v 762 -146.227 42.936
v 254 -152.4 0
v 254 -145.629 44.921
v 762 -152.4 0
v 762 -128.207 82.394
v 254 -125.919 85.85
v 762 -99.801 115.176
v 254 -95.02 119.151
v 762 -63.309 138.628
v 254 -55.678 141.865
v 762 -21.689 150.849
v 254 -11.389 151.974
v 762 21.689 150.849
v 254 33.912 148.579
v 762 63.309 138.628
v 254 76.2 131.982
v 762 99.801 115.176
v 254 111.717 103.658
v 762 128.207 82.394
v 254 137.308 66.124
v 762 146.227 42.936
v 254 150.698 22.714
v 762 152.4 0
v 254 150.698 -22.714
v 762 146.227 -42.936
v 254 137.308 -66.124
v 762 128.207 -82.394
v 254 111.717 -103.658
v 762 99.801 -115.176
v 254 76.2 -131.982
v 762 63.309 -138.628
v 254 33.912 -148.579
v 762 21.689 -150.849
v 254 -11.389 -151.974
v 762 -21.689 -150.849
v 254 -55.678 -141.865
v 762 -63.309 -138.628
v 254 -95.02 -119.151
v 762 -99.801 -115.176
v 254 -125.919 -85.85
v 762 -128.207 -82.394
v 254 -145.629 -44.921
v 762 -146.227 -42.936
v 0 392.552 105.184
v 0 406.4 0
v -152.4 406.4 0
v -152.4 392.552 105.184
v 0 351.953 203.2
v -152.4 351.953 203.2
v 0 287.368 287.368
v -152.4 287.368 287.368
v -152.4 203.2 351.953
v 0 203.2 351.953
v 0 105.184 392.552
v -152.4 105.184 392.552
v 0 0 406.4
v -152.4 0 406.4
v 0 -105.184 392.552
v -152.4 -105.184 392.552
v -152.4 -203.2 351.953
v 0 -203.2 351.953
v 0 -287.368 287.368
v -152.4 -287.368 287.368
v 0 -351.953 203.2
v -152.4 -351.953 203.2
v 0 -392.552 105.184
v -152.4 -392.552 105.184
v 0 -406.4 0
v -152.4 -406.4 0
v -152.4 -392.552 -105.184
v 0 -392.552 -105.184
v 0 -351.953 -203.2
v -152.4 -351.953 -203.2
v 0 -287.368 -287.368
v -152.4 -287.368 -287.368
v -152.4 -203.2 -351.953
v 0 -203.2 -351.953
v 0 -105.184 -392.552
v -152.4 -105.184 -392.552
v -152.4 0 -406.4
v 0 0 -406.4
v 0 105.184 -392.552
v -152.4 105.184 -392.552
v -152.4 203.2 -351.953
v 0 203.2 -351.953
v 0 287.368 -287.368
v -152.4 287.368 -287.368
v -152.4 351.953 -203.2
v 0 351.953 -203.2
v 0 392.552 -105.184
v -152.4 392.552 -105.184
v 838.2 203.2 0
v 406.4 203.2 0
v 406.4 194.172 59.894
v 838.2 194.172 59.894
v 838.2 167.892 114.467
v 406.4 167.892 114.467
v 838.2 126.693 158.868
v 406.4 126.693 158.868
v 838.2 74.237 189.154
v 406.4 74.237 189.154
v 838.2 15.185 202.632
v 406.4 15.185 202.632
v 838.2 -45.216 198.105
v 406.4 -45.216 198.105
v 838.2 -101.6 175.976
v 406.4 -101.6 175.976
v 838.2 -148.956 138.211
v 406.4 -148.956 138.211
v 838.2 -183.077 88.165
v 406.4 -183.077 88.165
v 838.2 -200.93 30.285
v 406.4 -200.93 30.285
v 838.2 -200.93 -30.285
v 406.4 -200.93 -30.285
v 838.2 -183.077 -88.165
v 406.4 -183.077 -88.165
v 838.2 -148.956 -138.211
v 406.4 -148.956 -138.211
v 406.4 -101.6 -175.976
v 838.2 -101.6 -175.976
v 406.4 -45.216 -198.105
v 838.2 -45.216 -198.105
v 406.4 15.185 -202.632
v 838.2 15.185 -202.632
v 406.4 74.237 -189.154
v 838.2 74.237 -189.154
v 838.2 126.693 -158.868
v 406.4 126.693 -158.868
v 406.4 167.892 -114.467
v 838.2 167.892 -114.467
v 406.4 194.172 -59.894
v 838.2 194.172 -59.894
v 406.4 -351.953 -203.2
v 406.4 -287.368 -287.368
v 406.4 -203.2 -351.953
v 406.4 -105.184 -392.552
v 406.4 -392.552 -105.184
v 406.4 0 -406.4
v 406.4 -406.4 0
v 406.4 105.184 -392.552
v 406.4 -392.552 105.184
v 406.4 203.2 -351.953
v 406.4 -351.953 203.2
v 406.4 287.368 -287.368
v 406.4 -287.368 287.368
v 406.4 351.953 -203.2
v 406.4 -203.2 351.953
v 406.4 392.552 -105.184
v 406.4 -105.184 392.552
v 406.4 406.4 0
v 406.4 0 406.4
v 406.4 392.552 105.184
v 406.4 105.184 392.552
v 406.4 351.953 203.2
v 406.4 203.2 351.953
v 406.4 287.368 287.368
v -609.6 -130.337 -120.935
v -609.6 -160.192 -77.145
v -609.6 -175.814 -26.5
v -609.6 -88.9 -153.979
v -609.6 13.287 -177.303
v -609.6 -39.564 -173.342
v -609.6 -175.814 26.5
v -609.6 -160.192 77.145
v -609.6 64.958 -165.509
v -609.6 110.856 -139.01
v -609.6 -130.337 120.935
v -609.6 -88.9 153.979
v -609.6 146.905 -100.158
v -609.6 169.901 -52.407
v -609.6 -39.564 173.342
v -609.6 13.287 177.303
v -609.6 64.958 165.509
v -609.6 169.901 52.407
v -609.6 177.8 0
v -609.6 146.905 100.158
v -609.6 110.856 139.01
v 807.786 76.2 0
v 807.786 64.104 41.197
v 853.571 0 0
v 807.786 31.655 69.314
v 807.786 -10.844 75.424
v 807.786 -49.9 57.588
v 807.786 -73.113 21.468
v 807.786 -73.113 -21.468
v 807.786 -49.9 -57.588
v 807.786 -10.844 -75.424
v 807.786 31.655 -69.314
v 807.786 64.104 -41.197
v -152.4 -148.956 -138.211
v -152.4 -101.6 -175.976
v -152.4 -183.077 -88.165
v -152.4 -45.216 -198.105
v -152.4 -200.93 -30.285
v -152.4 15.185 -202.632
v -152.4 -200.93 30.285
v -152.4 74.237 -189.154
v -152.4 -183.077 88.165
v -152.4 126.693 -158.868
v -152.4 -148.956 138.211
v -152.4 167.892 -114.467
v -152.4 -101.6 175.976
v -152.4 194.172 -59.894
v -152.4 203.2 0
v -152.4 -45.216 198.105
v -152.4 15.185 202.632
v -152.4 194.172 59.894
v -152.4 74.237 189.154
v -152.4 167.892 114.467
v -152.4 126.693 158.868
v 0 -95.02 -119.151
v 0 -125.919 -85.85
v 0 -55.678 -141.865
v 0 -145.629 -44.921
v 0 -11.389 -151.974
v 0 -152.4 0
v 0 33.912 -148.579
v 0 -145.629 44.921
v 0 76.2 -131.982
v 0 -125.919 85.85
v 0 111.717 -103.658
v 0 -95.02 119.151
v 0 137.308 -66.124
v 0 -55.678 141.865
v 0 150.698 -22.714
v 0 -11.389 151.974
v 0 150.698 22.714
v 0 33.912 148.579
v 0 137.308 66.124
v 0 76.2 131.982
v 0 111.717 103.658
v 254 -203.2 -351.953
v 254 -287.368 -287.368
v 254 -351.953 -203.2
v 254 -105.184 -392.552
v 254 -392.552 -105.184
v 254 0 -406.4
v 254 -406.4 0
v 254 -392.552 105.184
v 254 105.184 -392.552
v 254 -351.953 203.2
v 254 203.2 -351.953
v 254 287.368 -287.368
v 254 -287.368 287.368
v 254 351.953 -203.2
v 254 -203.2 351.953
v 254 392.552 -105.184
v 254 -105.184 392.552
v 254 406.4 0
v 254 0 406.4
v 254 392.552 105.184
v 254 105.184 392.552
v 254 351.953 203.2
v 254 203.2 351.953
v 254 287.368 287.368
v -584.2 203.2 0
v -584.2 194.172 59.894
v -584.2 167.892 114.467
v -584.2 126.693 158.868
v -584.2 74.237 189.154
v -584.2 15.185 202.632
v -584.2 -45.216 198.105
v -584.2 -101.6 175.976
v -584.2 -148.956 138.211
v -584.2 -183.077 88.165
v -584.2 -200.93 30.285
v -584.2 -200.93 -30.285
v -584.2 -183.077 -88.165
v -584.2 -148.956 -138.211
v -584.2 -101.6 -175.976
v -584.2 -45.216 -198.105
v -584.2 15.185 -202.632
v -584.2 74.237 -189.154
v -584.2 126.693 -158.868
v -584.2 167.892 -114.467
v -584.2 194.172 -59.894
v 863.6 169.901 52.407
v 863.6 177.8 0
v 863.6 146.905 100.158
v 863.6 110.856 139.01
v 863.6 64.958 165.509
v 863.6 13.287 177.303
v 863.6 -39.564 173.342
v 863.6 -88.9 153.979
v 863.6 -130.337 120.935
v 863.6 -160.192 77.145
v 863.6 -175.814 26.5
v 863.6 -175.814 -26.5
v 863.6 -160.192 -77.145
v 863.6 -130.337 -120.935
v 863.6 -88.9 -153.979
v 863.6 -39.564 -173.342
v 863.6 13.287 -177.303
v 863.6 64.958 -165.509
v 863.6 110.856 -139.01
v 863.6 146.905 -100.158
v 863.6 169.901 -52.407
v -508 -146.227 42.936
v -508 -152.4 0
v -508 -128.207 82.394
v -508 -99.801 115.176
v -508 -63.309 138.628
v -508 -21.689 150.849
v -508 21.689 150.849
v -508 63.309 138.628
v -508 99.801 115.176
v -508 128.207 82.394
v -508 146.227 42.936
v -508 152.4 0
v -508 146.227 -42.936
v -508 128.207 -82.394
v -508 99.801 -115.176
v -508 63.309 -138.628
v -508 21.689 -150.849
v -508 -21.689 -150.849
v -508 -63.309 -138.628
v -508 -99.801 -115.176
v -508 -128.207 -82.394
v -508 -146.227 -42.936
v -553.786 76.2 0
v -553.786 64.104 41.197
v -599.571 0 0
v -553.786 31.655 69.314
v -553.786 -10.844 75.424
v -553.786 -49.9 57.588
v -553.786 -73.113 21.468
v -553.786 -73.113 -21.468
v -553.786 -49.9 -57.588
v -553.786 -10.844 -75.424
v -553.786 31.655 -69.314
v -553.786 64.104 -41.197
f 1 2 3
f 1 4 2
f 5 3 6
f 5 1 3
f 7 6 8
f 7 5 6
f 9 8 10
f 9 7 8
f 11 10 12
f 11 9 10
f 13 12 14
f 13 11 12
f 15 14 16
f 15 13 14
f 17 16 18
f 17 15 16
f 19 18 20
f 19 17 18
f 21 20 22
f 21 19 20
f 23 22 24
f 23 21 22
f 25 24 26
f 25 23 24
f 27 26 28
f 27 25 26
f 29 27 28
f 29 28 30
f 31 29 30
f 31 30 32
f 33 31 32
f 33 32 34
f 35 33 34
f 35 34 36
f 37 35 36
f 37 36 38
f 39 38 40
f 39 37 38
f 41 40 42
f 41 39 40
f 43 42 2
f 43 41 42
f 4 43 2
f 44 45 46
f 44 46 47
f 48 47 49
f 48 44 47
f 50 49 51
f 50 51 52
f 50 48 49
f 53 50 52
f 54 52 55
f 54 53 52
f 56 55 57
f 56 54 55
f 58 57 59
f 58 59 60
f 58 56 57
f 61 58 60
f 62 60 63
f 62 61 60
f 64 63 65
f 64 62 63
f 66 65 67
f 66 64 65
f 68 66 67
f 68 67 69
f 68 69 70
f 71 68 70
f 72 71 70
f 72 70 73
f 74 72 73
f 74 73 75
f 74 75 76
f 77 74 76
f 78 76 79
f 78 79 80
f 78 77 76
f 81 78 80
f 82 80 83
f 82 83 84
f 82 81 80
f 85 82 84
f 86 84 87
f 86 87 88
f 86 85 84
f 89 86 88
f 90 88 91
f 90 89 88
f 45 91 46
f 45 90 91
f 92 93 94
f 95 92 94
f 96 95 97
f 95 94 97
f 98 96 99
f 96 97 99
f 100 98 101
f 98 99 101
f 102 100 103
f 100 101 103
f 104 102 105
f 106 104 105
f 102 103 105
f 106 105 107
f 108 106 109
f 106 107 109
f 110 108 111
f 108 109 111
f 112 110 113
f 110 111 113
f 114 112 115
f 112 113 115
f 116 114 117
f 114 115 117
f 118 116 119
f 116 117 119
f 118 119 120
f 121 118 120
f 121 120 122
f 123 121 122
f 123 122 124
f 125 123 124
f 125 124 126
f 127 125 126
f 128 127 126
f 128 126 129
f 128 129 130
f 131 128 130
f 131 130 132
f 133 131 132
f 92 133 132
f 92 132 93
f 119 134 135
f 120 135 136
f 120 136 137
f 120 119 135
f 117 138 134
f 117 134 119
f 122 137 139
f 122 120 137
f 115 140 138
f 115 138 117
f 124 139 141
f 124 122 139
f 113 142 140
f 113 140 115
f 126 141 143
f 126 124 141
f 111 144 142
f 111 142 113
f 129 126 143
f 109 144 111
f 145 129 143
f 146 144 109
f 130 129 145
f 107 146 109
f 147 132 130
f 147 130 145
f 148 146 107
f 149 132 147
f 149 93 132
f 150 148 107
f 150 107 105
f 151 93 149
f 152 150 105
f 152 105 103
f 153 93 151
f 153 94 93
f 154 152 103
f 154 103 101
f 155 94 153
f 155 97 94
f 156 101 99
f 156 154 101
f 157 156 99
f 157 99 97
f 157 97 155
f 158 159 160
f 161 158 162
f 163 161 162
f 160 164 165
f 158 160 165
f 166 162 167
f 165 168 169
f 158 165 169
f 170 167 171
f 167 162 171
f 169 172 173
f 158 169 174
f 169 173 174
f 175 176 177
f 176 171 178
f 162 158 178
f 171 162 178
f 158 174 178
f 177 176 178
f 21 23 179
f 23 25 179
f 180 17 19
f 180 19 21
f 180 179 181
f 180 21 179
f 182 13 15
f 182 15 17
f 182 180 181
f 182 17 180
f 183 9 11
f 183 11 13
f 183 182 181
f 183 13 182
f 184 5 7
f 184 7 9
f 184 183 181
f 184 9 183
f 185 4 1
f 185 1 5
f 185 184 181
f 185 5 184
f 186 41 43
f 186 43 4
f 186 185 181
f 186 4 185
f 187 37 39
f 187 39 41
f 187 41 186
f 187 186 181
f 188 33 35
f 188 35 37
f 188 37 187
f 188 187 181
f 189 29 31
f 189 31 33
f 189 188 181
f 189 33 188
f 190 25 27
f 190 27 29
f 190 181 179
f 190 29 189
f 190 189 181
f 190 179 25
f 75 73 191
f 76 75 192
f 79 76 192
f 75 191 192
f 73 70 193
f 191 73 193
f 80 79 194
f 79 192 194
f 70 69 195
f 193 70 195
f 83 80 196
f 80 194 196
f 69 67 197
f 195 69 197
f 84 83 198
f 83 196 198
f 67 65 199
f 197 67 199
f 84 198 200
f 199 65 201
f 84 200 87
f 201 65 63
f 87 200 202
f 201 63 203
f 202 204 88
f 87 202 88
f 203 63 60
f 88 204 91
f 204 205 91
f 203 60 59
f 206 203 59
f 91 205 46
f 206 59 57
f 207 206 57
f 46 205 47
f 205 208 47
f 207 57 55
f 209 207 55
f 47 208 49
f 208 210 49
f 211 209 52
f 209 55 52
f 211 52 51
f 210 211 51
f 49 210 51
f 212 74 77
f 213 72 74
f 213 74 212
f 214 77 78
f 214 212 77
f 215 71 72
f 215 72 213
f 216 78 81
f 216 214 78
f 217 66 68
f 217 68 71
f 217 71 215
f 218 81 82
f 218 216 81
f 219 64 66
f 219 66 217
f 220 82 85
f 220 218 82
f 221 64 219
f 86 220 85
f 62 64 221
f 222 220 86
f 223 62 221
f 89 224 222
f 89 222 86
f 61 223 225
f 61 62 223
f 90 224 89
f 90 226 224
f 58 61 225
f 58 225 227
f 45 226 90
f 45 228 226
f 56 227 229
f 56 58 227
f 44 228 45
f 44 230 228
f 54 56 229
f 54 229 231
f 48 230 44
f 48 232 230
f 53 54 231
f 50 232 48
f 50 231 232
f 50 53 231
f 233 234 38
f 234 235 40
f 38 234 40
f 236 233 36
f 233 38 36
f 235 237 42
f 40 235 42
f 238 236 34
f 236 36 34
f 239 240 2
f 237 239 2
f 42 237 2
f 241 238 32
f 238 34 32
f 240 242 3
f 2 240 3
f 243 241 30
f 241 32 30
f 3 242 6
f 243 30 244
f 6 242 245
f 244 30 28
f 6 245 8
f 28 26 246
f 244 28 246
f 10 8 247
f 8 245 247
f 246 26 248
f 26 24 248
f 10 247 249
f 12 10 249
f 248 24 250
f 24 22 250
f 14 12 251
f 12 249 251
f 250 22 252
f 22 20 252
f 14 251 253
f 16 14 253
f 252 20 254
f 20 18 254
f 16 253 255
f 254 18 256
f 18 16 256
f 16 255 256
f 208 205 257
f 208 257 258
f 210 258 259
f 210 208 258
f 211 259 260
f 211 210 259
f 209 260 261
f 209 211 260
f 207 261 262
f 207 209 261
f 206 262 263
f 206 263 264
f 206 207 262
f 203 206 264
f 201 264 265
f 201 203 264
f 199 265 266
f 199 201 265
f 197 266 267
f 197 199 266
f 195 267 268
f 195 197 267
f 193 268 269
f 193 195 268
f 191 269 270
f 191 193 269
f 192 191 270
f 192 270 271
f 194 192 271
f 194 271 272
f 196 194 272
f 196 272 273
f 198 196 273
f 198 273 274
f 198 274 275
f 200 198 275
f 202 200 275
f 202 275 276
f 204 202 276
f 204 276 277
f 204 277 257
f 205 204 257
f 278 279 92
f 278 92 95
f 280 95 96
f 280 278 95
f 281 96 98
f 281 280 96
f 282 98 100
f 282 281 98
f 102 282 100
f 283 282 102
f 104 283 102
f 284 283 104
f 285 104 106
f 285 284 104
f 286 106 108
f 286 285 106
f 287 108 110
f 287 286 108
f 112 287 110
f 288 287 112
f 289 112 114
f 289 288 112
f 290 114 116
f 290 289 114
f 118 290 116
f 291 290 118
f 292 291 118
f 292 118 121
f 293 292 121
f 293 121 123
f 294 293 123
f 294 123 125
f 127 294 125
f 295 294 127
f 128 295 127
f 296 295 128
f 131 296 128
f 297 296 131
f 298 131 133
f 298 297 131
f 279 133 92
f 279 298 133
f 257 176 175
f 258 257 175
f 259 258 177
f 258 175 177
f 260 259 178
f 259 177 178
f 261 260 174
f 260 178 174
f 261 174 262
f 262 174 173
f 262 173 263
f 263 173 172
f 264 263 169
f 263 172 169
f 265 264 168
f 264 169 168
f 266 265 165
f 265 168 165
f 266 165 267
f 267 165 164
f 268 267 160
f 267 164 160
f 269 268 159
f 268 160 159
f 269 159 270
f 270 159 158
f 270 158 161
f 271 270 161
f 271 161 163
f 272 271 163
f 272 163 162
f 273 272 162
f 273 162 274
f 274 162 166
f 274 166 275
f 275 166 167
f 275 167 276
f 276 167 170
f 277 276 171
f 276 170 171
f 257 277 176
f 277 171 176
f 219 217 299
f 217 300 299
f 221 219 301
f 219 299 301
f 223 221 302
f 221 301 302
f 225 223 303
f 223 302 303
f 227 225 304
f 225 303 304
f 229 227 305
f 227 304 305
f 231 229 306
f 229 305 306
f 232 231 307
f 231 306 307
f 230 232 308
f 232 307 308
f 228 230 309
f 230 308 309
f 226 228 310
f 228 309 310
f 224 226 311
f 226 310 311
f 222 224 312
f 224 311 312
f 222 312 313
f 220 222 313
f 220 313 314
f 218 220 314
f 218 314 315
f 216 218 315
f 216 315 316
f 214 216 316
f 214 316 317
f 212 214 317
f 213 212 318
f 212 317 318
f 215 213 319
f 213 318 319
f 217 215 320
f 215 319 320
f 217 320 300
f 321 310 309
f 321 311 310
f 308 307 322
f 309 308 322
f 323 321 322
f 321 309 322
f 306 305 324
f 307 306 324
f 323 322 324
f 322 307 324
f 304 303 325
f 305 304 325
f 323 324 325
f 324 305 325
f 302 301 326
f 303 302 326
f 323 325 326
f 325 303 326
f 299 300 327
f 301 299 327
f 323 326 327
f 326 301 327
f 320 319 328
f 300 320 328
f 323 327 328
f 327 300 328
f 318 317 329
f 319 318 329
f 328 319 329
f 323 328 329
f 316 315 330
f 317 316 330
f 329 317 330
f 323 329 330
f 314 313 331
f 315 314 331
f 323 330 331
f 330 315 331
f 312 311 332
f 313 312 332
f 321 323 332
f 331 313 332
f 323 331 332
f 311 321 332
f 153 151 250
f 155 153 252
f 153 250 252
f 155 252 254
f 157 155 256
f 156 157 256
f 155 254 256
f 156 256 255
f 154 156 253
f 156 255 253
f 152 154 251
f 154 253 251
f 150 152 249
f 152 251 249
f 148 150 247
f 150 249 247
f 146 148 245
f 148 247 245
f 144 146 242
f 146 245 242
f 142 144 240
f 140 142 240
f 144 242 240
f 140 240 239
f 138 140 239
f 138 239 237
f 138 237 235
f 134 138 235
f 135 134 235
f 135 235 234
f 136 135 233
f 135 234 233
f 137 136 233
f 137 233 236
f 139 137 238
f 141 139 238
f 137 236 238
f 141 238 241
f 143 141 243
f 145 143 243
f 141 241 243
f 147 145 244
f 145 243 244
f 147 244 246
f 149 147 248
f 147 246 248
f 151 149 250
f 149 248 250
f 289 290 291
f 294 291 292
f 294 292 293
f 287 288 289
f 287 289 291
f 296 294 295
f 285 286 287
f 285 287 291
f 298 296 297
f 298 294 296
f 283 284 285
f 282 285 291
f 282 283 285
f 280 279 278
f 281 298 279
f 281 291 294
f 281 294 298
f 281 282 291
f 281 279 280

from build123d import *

# Parameters (mm, degrees)
F0_R     = 203.2
F1_DEPTH = 609.6
F3_D     = 304.8
F3_DEPTH = 508
F3_TIP   = 91.5711583398
F0_R_2   = 406.4
F4_DEPTH = 152.4
F5_SIZE2 = 25.4
F5_SIZE  = 25.4


# Not quite as in the source:
# - a feature names something its author has since deleted; it is built from what else it names


with BuildPart() as f1:
    # F0 (on Right) → F1 (new body)
    with BuildSketch(Plane.YZ):
        Circle(F0_R)
    extrude(amount=-F1_DEPTH)

    # F3
    with Locations(Plane.YZ):
        with Locations((0, 0)):
            Hole(F3_D / 2, depth=F3_DEPTH)
            with Locations((0, 0, -(F3_DEPTH + F3_TIP / 2))):  # 118° drill point
                Cone(0, F3_D / 2, F3_TIP, mode=Mode.SUBTRACT)

    # F0 (on Right) → F4 (join)
    with BuildSketch(Plane.YZ):
        Circle(F0_R_2)
        Circle(F0_R, mode=Mode.SUBTRACT)
    extrude(amount=-F4_DEPTH)

    # F5
    f5_edges = [f1.edges().sort_by_distance(p)[0] for p in [
        (-609.6, -203.2, 0),
    ]]
    chamfer(f5_edges, length=F5_SIZE, length2=F5_SIZE2)


with BuildPart() as f7_1:
    # F7: instance of F1
    add(f1.part.mirror(Plane.YZ.offset(127)))


solid = Compound([f1.part, f7_1.part])
